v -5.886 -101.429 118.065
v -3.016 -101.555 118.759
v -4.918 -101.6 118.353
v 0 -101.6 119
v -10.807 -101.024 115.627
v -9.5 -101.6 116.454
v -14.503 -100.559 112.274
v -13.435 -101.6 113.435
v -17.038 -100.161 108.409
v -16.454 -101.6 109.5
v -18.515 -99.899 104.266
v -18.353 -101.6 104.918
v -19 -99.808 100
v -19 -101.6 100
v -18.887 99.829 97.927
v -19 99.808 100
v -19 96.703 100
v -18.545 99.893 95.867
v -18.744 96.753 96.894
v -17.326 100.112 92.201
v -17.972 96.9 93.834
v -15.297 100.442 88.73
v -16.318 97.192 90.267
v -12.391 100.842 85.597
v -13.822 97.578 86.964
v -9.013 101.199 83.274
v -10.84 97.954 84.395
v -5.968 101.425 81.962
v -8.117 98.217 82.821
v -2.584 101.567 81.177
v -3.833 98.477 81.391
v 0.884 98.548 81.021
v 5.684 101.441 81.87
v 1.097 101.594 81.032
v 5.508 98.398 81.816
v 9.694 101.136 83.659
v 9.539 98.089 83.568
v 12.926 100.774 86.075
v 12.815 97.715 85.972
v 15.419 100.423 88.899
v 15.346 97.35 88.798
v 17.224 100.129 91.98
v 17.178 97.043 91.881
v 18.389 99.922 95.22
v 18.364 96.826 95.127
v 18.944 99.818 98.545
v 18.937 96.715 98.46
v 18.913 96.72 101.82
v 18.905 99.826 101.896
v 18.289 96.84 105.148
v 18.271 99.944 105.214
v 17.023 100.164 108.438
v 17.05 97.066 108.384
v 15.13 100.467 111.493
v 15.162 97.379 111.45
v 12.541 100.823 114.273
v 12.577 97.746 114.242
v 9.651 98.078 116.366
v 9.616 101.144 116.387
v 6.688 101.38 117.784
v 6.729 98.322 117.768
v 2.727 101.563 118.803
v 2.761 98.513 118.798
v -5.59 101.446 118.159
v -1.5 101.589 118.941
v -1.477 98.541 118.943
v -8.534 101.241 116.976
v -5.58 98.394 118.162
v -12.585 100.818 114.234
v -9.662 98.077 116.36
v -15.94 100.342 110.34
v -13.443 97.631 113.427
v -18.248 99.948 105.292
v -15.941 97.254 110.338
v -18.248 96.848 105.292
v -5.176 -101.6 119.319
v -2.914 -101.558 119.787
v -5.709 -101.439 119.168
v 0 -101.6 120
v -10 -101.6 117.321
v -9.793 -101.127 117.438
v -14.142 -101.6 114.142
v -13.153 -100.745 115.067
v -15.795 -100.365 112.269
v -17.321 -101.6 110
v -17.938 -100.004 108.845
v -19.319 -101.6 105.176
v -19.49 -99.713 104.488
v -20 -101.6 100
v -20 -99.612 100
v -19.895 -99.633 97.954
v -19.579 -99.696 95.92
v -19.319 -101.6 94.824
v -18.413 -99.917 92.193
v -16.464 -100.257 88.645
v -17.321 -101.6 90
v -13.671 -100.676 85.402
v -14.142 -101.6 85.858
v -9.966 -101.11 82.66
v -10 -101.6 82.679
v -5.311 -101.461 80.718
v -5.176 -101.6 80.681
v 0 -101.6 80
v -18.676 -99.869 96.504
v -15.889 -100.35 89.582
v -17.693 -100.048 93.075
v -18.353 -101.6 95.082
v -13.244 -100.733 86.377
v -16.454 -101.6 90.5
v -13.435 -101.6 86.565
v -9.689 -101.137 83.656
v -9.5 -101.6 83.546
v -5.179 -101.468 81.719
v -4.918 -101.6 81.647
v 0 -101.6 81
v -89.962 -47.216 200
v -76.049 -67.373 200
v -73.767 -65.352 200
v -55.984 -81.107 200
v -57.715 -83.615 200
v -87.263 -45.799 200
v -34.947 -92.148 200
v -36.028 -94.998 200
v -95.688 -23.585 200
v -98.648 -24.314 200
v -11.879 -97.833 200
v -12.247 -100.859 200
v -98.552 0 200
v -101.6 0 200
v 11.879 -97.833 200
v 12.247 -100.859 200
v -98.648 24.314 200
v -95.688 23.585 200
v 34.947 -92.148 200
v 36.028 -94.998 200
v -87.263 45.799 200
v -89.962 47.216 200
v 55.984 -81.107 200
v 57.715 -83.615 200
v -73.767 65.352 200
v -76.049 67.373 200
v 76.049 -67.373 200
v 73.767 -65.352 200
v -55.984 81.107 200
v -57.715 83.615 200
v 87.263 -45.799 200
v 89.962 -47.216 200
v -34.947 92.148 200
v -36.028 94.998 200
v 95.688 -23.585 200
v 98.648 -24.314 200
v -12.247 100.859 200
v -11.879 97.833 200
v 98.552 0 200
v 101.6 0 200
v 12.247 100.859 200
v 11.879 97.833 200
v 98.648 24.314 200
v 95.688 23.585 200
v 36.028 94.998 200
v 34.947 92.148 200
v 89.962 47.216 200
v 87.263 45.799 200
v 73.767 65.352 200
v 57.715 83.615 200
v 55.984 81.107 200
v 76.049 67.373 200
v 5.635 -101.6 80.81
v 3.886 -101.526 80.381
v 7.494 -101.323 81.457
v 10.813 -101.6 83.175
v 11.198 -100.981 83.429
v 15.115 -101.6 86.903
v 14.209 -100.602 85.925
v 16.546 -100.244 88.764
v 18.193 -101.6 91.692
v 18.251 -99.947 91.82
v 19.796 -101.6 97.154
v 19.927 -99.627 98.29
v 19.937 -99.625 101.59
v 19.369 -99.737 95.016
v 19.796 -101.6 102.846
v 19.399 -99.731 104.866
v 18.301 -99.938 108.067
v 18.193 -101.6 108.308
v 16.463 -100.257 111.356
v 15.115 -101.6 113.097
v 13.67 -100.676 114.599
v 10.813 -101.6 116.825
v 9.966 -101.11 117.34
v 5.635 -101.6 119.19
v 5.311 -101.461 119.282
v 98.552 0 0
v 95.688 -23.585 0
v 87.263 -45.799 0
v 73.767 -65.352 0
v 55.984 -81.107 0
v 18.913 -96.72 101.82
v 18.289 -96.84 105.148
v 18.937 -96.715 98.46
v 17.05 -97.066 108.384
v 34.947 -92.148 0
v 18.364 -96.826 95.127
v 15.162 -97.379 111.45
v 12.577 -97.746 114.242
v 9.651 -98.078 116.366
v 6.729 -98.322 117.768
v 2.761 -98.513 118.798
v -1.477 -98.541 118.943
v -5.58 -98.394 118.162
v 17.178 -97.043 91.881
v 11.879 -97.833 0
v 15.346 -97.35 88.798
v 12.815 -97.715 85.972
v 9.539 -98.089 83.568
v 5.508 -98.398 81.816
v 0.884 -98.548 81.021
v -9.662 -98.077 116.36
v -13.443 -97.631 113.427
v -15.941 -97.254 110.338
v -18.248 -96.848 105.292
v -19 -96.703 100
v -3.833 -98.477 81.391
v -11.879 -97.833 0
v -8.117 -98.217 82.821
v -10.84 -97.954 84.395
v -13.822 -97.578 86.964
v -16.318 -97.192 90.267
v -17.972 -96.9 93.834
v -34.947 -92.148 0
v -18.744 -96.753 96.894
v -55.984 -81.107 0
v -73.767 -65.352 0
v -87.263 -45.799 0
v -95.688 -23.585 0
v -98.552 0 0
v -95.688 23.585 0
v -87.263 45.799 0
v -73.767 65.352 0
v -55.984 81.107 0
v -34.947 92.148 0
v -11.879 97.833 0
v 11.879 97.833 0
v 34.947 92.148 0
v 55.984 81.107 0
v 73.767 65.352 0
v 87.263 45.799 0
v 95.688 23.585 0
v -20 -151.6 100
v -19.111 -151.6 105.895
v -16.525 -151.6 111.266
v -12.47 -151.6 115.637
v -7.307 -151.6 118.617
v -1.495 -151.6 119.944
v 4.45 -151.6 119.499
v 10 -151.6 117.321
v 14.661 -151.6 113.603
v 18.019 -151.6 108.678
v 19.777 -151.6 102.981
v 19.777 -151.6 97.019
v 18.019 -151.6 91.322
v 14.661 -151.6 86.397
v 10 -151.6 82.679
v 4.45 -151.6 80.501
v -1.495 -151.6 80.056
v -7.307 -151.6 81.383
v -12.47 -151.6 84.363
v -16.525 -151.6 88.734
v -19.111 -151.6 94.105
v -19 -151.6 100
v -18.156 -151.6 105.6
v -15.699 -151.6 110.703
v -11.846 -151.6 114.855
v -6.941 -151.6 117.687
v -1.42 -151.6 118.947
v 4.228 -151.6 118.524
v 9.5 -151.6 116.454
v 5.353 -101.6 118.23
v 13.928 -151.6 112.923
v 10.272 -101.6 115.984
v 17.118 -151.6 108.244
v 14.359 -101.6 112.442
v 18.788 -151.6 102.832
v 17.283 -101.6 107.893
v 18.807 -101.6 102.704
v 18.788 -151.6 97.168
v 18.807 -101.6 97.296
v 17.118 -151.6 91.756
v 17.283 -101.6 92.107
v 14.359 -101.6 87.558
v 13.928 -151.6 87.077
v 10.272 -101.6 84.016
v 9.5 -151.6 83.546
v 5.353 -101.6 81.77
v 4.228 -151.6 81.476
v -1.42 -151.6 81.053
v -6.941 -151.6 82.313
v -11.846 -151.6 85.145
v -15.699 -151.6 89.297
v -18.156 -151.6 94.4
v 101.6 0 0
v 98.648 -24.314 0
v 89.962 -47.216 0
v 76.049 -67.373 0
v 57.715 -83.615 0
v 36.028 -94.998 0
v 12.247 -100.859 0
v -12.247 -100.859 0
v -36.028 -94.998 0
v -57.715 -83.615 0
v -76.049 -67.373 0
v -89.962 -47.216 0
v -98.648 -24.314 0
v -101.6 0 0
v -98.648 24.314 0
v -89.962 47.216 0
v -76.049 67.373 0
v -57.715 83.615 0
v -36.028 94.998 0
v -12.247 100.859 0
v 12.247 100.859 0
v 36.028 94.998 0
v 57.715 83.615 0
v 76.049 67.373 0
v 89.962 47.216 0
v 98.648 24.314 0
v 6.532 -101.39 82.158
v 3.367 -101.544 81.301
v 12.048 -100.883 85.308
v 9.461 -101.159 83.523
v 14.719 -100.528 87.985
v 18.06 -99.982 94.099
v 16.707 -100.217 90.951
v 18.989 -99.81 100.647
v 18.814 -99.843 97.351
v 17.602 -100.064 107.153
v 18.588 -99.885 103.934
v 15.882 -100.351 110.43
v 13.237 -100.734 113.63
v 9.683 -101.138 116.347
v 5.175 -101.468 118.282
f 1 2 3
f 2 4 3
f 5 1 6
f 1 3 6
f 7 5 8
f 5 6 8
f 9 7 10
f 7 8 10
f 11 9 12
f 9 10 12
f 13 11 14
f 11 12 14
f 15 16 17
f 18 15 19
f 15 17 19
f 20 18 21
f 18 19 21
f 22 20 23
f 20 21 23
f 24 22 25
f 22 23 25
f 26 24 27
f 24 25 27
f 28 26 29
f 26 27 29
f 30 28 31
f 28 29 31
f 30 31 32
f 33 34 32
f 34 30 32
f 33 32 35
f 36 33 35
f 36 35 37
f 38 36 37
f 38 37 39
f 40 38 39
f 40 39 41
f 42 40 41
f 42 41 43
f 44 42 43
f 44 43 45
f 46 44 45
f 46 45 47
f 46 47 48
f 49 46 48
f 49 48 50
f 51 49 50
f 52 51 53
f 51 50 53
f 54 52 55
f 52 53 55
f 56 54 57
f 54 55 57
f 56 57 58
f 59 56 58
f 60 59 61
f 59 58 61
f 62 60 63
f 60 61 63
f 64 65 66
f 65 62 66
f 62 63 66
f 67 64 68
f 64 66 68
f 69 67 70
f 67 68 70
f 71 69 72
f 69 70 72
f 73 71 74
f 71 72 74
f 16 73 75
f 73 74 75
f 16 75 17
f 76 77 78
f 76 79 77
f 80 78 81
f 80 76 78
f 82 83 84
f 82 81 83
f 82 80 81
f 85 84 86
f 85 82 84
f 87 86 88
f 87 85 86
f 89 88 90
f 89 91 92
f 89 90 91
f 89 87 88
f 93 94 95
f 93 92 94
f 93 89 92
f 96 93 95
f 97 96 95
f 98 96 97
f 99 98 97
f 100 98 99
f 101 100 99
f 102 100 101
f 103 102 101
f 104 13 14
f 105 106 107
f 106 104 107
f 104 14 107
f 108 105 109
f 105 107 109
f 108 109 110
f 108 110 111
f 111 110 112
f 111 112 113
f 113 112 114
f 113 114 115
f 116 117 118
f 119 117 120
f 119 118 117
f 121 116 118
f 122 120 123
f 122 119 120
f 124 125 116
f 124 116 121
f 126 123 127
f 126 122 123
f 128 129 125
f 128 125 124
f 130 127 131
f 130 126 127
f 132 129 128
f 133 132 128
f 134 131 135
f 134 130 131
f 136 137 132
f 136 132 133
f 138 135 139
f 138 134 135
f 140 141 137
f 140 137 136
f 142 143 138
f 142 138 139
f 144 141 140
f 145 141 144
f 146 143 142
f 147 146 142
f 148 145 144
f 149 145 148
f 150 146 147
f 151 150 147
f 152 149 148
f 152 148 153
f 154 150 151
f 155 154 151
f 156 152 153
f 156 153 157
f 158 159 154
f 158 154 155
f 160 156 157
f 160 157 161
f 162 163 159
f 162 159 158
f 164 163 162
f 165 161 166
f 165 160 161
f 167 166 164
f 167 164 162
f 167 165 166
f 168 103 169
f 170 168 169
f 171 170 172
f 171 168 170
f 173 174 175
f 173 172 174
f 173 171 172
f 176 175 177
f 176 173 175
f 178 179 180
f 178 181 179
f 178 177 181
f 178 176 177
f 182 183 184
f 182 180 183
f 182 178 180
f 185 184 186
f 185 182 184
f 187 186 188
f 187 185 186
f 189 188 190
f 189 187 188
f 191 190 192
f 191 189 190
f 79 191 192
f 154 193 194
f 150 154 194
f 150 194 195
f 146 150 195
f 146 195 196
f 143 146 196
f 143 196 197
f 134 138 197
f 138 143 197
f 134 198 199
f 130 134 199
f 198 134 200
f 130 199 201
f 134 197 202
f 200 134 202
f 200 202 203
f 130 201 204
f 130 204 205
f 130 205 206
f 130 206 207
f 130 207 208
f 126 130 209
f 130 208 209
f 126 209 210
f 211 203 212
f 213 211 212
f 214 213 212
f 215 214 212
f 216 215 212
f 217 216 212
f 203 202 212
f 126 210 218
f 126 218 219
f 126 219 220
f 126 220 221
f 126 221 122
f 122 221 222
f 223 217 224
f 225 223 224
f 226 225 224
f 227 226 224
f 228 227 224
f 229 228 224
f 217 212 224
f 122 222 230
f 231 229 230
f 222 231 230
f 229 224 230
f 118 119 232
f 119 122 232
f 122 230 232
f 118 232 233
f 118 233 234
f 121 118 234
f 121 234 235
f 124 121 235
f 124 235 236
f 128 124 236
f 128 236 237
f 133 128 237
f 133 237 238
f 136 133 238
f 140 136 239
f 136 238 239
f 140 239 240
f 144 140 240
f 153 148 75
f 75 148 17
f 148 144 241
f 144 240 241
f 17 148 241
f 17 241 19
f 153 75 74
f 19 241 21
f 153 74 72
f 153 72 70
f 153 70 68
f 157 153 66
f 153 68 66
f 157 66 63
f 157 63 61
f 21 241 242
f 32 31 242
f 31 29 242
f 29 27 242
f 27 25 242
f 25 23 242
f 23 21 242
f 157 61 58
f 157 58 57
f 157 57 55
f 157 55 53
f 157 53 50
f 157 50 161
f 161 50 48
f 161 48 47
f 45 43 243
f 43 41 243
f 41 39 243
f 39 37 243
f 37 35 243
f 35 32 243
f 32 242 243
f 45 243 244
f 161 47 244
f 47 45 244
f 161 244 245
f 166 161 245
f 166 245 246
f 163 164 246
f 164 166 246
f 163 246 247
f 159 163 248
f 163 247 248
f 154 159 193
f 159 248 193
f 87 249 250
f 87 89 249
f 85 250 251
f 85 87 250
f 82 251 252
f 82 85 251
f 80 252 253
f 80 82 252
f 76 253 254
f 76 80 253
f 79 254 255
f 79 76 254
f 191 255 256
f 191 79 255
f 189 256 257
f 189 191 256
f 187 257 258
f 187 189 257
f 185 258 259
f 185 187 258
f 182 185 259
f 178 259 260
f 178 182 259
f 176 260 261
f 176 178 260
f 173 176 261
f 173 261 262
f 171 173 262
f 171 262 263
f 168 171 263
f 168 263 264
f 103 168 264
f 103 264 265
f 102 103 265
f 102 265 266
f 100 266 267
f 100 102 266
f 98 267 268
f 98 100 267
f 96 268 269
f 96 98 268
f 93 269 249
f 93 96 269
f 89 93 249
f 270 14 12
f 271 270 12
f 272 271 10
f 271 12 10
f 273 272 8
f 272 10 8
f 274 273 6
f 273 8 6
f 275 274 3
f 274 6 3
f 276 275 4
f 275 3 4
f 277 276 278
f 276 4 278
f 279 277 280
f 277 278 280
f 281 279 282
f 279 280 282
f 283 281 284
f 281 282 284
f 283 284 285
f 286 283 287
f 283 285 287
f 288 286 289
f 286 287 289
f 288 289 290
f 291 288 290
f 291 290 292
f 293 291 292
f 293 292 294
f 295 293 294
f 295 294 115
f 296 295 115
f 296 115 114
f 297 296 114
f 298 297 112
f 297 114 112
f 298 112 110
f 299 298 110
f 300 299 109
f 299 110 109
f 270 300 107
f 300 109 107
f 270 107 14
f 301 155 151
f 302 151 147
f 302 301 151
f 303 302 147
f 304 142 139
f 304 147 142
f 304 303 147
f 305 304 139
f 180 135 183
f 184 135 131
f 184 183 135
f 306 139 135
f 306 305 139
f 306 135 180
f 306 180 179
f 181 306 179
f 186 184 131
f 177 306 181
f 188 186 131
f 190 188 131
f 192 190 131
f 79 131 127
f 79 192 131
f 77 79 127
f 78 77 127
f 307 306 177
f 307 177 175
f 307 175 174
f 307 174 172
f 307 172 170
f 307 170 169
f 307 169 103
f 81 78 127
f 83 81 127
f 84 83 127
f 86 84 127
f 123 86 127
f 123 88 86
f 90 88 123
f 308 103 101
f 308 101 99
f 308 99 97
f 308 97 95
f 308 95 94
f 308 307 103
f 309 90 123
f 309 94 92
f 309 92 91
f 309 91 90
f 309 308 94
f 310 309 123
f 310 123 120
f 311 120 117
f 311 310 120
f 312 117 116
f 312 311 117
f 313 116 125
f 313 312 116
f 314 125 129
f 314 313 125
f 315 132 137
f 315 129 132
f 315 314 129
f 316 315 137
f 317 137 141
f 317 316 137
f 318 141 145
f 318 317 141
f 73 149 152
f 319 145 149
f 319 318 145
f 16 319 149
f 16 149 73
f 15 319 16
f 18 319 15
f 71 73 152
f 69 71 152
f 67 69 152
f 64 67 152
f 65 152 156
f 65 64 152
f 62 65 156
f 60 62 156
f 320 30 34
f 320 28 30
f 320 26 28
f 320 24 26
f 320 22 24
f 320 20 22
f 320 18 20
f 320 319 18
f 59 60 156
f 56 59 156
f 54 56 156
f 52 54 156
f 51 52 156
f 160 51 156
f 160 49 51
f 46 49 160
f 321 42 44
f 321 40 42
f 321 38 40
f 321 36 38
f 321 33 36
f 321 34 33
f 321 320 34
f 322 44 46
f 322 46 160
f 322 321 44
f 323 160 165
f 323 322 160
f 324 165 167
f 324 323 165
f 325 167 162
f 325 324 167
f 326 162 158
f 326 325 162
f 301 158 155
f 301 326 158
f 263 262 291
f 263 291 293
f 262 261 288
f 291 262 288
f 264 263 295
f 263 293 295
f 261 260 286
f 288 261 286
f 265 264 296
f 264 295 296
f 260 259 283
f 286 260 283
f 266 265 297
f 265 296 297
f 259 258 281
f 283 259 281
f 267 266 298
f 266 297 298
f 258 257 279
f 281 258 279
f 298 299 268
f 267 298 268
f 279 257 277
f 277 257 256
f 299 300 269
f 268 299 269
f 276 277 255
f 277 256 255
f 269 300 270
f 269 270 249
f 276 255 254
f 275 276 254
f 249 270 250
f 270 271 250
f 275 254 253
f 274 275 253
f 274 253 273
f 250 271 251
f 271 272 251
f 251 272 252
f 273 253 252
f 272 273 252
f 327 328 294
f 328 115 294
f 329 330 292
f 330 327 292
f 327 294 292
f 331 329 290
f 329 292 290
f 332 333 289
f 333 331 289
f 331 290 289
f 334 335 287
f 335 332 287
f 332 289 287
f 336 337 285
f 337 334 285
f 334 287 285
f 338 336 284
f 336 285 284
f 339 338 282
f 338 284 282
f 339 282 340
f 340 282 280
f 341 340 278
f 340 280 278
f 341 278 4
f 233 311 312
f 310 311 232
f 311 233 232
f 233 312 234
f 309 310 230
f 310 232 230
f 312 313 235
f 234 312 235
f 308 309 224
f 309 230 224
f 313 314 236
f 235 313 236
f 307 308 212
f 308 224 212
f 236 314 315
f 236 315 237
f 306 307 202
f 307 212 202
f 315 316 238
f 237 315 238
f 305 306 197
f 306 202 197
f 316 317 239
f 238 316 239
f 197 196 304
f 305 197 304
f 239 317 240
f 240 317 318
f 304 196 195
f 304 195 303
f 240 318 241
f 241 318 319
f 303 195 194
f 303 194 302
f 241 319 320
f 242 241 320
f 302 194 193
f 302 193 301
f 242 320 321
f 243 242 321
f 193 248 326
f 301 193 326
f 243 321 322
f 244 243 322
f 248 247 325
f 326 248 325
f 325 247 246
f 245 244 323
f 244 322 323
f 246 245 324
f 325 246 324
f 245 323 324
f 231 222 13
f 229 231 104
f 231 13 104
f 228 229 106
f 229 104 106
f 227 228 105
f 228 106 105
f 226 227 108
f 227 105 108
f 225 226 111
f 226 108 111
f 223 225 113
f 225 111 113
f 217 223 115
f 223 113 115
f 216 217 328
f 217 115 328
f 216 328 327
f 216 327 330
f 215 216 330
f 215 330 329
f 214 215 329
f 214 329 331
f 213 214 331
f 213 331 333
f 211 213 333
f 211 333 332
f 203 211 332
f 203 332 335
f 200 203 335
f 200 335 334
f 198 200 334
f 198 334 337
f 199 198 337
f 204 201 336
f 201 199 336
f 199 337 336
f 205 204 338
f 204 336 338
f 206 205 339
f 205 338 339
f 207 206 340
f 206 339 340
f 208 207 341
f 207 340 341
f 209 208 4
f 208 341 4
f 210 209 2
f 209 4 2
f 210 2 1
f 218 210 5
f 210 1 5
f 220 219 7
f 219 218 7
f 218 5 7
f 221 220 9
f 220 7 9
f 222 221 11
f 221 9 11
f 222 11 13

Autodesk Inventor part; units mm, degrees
ref_plane "YZ Plane" through (0, 0, 0) normal (1, 0, 0) x (0, 1, 0)
ref_plane "XY Plane" through (0, 0, 0) normal (0, 0, 1) x (1, 0, 0)
sketch "Sketch1" plane through (0, 0, 0) normal (0, 0, 1) x (1, 0, 0)
  circle A0 centre (0, 0) radius 98.552
  circle A1 centre (0, 0) radius 101.6
  dimension "d0" = 197.104
  dimension "d1" = 203.2
extrude "Extrusion1" add sketch "Sketch1" along normal blind 200
ref_plane "Work Plane1" through (0, 101.6, 0) normal (0, 1, 0) x (-1, 0, 0)
ref_plane "Work Plane2" through (0, -101.6, 0) normal (0, 1, 0) x (-1, 0, 0)
sketch "Sketch7" plane through (0, -101.6, 0) normal (0, 1, 0) x (-1, 0, 0)
  circle A0 centre (0, 100) radius 19
  circle A1 centre (0, 100) radius 20
  line L0 (-101.6, 0) -> (101.6, 0) projected
  point P0 (0, 0)
  point P1 (20, 100)
  dimension "d11" = 40
  dimension "d12" = 38
  dimension "d13" = 100
extrude "Extrusion3" add sketch "Sketch7" along normal up to next
sketch "Sketch9" plane through (0, -101.6, 0) normal (0, 1, 0) x (-1, 0, 0)
  circle A0 centre (0, 100) radius 19
  circle A1 centre (0, 100) radius 20
  point P0 (0, 0)
  point P1 (20, 100)
  dimension "d16" = 40
  dimension "d17" = 38
extrude "Extrusion4" add sketch "Sketch9" against normal blind 50
sketch "Sketch10" plane through (0, -101.6, 0) normal (0, 1, 0) x (-1, 0, 0)
  circle A0 centre (0, 100) radius 19
  point P0 (0, 0)
  point P1 (20, 100)
extrude "Extrusion5" cut sketch "Sketch10" along normal through all
equation "\"BendRadius\" = Thickness"
equation "\"BendReliefWidth\" = Thickness"
equation "\"BendReliefDepth\" = 0.5 * Thickness"
equation "\"CornerReliefSize\" = 4 * Thickness"
equation "\"MinimumRemnant\" = 2 * Thickness"
equation "\"TransitionRadius\" = BendRadius"
equation "\"JacobiRadiusSize\" = Thickness"
equation "\"GapSize\" = Thickness"
equation "\"Thickness\" = 3.048"
properties part number "VacuumCylinder"
